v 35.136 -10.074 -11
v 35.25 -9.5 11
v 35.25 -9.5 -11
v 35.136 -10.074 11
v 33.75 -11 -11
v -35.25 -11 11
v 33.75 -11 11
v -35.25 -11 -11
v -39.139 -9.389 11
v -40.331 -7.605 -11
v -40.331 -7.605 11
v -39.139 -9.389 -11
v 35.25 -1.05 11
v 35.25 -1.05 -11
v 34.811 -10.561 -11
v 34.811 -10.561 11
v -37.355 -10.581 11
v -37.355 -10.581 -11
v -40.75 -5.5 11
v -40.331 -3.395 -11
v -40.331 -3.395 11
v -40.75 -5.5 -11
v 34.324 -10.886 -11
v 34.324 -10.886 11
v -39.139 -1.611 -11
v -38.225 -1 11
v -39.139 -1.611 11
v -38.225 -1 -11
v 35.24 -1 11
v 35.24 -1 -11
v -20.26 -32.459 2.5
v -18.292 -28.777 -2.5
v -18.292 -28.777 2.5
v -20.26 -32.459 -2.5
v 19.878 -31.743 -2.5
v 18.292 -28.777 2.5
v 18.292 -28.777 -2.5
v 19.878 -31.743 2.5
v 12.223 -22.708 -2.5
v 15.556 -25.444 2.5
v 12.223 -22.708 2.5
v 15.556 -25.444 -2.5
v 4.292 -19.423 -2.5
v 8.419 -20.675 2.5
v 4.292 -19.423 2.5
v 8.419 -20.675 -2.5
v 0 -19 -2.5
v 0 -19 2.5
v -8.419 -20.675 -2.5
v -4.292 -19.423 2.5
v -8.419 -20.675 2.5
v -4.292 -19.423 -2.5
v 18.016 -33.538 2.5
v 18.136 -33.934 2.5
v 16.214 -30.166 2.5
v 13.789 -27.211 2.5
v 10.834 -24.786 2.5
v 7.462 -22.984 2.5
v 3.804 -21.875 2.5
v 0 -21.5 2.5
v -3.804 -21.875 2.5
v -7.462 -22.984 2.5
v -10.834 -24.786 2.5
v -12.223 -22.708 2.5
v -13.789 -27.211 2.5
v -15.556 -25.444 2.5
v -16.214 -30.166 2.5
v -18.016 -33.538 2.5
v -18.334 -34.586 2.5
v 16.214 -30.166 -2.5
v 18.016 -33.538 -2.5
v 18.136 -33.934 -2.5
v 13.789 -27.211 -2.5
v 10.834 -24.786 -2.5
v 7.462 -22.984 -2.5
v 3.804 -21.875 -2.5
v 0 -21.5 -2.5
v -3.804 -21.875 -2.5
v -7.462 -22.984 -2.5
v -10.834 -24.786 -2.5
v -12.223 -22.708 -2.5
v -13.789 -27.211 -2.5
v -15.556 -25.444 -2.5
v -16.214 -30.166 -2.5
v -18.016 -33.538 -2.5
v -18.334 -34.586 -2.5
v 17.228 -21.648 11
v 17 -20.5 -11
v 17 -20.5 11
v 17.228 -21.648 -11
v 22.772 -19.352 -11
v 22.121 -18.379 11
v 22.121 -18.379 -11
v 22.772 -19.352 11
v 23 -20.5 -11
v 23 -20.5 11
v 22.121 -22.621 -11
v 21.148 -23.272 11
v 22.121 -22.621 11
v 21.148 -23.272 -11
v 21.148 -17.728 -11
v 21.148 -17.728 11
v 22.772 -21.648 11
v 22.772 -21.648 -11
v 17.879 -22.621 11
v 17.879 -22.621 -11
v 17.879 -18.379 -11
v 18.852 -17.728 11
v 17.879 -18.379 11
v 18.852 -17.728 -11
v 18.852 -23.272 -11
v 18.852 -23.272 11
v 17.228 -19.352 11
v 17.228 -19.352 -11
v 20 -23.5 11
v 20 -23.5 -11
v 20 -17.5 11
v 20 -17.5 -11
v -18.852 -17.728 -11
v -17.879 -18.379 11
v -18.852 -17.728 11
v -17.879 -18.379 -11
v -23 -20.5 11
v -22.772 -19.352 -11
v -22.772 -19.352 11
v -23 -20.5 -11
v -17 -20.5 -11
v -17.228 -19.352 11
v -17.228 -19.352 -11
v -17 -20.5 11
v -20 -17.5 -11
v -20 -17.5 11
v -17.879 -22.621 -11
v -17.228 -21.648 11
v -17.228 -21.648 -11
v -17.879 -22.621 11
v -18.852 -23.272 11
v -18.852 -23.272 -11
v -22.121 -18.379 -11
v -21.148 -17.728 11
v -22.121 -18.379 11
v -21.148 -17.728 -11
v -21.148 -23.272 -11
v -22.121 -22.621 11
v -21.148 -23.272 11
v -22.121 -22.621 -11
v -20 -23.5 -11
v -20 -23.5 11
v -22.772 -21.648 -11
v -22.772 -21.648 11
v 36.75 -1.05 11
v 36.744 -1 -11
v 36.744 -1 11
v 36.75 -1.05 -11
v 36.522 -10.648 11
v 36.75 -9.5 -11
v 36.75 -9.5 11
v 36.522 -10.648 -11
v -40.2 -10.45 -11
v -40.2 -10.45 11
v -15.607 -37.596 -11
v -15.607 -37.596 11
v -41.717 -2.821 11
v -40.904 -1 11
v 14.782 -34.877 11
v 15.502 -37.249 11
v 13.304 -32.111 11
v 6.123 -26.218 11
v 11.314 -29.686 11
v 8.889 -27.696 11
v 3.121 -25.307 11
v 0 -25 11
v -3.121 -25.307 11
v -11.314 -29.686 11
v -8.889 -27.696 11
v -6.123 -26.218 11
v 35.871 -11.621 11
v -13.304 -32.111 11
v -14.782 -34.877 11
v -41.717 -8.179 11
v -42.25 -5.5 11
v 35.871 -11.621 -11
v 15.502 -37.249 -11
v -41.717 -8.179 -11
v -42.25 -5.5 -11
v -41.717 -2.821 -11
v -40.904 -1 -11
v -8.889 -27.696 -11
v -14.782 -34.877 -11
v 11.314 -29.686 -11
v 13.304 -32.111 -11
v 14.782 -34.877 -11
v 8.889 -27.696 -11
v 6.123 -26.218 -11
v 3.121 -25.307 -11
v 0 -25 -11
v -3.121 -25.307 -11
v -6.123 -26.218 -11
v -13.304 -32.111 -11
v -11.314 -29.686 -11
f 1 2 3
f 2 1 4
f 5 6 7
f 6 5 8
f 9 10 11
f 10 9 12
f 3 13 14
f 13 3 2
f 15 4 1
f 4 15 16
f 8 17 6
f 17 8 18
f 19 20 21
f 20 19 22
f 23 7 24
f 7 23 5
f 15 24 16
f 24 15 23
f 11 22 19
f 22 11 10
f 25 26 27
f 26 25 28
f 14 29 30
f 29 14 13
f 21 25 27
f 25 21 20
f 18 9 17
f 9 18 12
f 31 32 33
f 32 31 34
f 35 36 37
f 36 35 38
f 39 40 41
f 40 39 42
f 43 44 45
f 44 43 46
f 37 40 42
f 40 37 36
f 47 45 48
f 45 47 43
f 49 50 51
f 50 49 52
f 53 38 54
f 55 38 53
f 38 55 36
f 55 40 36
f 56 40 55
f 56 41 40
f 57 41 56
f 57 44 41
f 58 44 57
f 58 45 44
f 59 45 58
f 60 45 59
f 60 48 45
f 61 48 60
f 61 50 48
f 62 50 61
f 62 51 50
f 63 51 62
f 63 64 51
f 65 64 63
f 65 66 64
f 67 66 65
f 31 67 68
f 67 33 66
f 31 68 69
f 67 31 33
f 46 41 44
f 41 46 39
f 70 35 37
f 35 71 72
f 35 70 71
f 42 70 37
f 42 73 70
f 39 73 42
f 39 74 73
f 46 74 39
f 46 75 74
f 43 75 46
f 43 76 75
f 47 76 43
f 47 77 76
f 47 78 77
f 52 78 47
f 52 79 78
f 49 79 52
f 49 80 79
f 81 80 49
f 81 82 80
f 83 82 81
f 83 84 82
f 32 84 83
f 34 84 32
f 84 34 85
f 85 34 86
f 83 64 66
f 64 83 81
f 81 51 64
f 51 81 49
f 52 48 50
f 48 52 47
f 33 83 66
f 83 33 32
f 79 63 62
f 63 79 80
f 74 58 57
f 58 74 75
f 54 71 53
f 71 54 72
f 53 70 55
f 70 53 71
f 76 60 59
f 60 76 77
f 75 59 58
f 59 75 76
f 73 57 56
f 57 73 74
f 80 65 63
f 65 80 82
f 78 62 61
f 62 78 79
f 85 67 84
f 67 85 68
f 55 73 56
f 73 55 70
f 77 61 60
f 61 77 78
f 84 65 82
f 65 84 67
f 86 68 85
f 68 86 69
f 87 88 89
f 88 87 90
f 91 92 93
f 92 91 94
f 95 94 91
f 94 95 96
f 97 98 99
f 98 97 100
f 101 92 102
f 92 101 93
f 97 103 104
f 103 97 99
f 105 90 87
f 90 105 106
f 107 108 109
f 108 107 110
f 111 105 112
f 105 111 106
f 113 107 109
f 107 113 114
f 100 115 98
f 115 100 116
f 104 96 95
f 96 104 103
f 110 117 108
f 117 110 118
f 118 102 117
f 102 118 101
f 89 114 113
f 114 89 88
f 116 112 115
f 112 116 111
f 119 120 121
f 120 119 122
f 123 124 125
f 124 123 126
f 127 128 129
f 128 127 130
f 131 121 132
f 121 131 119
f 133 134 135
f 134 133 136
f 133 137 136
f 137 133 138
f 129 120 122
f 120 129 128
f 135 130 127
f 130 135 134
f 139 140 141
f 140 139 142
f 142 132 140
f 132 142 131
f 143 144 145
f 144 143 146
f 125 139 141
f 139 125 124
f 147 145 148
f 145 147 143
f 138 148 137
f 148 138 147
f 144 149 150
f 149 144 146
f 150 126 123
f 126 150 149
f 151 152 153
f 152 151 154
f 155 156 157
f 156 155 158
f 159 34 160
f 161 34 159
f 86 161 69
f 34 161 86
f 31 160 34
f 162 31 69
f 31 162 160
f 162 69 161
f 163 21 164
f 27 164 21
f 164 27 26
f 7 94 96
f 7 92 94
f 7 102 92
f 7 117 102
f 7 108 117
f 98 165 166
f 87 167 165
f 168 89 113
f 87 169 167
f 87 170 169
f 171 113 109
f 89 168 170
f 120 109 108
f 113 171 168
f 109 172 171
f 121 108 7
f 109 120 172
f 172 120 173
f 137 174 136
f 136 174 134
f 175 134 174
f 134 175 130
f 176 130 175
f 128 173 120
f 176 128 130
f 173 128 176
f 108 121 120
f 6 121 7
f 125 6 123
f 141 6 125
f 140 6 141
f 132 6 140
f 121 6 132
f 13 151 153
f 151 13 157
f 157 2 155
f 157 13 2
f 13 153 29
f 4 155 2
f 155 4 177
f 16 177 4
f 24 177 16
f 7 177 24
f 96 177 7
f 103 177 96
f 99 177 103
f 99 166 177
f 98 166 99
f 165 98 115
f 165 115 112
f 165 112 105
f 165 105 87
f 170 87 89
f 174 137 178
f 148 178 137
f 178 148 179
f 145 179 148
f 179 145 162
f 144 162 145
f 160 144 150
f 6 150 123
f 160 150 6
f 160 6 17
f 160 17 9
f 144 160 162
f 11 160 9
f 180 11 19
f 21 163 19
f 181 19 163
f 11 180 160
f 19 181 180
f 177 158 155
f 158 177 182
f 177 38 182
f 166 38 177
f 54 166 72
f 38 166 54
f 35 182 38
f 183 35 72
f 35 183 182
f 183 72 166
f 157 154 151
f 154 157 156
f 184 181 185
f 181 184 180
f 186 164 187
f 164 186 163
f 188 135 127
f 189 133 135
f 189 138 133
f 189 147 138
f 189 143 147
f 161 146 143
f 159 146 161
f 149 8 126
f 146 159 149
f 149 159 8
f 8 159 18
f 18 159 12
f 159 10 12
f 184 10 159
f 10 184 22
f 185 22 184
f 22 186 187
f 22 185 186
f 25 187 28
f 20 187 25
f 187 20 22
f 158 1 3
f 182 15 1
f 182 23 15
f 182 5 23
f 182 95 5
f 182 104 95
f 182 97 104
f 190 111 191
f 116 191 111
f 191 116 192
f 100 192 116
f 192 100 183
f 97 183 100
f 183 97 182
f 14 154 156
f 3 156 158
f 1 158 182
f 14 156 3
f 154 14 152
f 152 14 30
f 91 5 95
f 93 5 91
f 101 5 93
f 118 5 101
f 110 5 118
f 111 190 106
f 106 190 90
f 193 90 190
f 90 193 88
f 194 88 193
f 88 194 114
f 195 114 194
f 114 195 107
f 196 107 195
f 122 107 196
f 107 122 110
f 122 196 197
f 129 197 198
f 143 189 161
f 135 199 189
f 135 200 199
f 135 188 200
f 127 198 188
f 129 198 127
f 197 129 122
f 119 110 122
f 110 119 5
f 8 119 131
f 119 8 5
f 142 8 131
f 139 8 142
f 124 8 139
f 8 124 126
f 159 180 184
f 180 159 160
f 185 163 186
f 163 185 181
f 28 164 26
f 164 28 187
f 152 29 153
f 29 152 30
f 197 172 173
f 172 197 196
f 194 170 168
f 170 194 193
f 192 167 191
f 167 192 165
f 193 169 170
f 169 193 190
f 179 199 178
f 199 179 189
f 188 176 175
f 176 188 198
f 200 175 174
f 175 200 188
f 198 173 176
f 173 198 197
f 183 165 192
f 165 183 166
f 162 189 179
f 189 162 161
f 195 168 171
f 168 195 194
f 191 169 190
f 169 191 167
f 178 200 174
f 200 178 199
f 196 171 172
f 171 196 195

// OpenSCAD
/*

Mount to attach Xperia Z5 phone to my bike stem

(c) 2016 Richard Bowman, released under CERN open hardware license

*/

use <utilities.scad>;
d = 0.05;
$fn=16;
bar_z = -32/2-11-14;

module annulus(inner_r,thickness,h,center=false){
	difference(){
		cylinder(r=inner_r+thickness,h=h,center=center);
		cylinder(r=inner_r,h=99999,center=true);
	}
}
module cable_tie(inner_r,center=false){
	annulus(inner_r+1.5,2.5,5,center=center);
}
module phone(h=135){
    phonebox=[67+0.5,h,11.4];
    case_t=11;
    case_rroc=1.5;
    union(){
        translate([-phonebox[0]/2,0,-d]) cube(phonebox);
        hull(){
            translate([-phonebox[0]/2-7+case_t/2,0,-case_t/2]) rotate([-90,0,0]) cylinder(d=case_t,h=h);
            translate([phonebox[0]/2,0,-case_rroc*0.7]) rotate([-90,0,0]) cylinder(r=case_rroc,h=h);
            translate([phonebox[0]/2,0,-case_t+case_rroc]) rotate([-90,0,0]) cylinder(r=case_rroc,h=h);
        }
    }
}

module handlebar(){
    clamp_w = 43;
    clamp_roc = 5;
    clamp_h = 11;
    bar_r = 32/2;
    union(){
        rotate([0,90,0]) cylinder(r=bar_r,h=150,$fn=32, center=true);
        rotate([-90,0,0]) hull(){
            reflect([1,0,0]) reflect([0,1,0]) 
                translate([clamp_w/2-clamp_roc,clamp_h+bar_r-clamp_roc,0]) 
                cylinder(r=clamp_roc,h=bar_r*3,center=true);
        }
    }
}

module top_mount(h=22, top_t=1){
    difference(){
        hull(){
            rotate([-90,0,0]) linear_extrude(h, center=true){
                minkowski(){
                    circle(r=1.5);
                    projection() rotate([90,0,0]) phone();
                }
            }
            translate([0,0,bar_z]) cube([(28+3)*2,h,d],center=true);
        }
        translate([0,-135+h/2-top_t,0]) phone();
        translate([0,0,bar_z]) handlebar();
        //cable ties
        reflect([1,0,0]) translate([28,0,bar_z]) rotate([0,90,0]) cable_tie(32/2+3, center=true, $fn=32);
    }
}
module bottom_mount(h=22, top_t=1){
    difference(){
        hull(){
            rotate([-90,0,0]) linear_extrude(h, center=true){
                minkowski(){
                    circle(r=1.5);
                    projection() rotate([90,0,0]) phone();
                }
            }
            translate([0,0,bar_z]) cube([25,h,d],center=true);
        }
        translate([0,0,-1]) cylinder(r=999,h=999,$fn=8);
        translate([0,-135/2,0]) phone();
        translate([0,0,bar_z]) rotate([90,0,0]) cylinder(d=32,h=100,center=true,$fn=32);
        //cable ties
        translate([0,0,bar_z]) rotate([90,0,0]) cable_tie(32/2+2, center=true, $fn=32);
        //anchor points
        reflect([1,0,0]) translate([20,0,bar_z/2]) rotate([90,0,0]) cylinder(d=6,h=999,center=true);
    }
}

rotate([-90,0,0]) bottom_mount();//h=0.5,top_t=-1);

//rotate([-90,0,0]) top_mount();//h=0.5,top_t=-1);
